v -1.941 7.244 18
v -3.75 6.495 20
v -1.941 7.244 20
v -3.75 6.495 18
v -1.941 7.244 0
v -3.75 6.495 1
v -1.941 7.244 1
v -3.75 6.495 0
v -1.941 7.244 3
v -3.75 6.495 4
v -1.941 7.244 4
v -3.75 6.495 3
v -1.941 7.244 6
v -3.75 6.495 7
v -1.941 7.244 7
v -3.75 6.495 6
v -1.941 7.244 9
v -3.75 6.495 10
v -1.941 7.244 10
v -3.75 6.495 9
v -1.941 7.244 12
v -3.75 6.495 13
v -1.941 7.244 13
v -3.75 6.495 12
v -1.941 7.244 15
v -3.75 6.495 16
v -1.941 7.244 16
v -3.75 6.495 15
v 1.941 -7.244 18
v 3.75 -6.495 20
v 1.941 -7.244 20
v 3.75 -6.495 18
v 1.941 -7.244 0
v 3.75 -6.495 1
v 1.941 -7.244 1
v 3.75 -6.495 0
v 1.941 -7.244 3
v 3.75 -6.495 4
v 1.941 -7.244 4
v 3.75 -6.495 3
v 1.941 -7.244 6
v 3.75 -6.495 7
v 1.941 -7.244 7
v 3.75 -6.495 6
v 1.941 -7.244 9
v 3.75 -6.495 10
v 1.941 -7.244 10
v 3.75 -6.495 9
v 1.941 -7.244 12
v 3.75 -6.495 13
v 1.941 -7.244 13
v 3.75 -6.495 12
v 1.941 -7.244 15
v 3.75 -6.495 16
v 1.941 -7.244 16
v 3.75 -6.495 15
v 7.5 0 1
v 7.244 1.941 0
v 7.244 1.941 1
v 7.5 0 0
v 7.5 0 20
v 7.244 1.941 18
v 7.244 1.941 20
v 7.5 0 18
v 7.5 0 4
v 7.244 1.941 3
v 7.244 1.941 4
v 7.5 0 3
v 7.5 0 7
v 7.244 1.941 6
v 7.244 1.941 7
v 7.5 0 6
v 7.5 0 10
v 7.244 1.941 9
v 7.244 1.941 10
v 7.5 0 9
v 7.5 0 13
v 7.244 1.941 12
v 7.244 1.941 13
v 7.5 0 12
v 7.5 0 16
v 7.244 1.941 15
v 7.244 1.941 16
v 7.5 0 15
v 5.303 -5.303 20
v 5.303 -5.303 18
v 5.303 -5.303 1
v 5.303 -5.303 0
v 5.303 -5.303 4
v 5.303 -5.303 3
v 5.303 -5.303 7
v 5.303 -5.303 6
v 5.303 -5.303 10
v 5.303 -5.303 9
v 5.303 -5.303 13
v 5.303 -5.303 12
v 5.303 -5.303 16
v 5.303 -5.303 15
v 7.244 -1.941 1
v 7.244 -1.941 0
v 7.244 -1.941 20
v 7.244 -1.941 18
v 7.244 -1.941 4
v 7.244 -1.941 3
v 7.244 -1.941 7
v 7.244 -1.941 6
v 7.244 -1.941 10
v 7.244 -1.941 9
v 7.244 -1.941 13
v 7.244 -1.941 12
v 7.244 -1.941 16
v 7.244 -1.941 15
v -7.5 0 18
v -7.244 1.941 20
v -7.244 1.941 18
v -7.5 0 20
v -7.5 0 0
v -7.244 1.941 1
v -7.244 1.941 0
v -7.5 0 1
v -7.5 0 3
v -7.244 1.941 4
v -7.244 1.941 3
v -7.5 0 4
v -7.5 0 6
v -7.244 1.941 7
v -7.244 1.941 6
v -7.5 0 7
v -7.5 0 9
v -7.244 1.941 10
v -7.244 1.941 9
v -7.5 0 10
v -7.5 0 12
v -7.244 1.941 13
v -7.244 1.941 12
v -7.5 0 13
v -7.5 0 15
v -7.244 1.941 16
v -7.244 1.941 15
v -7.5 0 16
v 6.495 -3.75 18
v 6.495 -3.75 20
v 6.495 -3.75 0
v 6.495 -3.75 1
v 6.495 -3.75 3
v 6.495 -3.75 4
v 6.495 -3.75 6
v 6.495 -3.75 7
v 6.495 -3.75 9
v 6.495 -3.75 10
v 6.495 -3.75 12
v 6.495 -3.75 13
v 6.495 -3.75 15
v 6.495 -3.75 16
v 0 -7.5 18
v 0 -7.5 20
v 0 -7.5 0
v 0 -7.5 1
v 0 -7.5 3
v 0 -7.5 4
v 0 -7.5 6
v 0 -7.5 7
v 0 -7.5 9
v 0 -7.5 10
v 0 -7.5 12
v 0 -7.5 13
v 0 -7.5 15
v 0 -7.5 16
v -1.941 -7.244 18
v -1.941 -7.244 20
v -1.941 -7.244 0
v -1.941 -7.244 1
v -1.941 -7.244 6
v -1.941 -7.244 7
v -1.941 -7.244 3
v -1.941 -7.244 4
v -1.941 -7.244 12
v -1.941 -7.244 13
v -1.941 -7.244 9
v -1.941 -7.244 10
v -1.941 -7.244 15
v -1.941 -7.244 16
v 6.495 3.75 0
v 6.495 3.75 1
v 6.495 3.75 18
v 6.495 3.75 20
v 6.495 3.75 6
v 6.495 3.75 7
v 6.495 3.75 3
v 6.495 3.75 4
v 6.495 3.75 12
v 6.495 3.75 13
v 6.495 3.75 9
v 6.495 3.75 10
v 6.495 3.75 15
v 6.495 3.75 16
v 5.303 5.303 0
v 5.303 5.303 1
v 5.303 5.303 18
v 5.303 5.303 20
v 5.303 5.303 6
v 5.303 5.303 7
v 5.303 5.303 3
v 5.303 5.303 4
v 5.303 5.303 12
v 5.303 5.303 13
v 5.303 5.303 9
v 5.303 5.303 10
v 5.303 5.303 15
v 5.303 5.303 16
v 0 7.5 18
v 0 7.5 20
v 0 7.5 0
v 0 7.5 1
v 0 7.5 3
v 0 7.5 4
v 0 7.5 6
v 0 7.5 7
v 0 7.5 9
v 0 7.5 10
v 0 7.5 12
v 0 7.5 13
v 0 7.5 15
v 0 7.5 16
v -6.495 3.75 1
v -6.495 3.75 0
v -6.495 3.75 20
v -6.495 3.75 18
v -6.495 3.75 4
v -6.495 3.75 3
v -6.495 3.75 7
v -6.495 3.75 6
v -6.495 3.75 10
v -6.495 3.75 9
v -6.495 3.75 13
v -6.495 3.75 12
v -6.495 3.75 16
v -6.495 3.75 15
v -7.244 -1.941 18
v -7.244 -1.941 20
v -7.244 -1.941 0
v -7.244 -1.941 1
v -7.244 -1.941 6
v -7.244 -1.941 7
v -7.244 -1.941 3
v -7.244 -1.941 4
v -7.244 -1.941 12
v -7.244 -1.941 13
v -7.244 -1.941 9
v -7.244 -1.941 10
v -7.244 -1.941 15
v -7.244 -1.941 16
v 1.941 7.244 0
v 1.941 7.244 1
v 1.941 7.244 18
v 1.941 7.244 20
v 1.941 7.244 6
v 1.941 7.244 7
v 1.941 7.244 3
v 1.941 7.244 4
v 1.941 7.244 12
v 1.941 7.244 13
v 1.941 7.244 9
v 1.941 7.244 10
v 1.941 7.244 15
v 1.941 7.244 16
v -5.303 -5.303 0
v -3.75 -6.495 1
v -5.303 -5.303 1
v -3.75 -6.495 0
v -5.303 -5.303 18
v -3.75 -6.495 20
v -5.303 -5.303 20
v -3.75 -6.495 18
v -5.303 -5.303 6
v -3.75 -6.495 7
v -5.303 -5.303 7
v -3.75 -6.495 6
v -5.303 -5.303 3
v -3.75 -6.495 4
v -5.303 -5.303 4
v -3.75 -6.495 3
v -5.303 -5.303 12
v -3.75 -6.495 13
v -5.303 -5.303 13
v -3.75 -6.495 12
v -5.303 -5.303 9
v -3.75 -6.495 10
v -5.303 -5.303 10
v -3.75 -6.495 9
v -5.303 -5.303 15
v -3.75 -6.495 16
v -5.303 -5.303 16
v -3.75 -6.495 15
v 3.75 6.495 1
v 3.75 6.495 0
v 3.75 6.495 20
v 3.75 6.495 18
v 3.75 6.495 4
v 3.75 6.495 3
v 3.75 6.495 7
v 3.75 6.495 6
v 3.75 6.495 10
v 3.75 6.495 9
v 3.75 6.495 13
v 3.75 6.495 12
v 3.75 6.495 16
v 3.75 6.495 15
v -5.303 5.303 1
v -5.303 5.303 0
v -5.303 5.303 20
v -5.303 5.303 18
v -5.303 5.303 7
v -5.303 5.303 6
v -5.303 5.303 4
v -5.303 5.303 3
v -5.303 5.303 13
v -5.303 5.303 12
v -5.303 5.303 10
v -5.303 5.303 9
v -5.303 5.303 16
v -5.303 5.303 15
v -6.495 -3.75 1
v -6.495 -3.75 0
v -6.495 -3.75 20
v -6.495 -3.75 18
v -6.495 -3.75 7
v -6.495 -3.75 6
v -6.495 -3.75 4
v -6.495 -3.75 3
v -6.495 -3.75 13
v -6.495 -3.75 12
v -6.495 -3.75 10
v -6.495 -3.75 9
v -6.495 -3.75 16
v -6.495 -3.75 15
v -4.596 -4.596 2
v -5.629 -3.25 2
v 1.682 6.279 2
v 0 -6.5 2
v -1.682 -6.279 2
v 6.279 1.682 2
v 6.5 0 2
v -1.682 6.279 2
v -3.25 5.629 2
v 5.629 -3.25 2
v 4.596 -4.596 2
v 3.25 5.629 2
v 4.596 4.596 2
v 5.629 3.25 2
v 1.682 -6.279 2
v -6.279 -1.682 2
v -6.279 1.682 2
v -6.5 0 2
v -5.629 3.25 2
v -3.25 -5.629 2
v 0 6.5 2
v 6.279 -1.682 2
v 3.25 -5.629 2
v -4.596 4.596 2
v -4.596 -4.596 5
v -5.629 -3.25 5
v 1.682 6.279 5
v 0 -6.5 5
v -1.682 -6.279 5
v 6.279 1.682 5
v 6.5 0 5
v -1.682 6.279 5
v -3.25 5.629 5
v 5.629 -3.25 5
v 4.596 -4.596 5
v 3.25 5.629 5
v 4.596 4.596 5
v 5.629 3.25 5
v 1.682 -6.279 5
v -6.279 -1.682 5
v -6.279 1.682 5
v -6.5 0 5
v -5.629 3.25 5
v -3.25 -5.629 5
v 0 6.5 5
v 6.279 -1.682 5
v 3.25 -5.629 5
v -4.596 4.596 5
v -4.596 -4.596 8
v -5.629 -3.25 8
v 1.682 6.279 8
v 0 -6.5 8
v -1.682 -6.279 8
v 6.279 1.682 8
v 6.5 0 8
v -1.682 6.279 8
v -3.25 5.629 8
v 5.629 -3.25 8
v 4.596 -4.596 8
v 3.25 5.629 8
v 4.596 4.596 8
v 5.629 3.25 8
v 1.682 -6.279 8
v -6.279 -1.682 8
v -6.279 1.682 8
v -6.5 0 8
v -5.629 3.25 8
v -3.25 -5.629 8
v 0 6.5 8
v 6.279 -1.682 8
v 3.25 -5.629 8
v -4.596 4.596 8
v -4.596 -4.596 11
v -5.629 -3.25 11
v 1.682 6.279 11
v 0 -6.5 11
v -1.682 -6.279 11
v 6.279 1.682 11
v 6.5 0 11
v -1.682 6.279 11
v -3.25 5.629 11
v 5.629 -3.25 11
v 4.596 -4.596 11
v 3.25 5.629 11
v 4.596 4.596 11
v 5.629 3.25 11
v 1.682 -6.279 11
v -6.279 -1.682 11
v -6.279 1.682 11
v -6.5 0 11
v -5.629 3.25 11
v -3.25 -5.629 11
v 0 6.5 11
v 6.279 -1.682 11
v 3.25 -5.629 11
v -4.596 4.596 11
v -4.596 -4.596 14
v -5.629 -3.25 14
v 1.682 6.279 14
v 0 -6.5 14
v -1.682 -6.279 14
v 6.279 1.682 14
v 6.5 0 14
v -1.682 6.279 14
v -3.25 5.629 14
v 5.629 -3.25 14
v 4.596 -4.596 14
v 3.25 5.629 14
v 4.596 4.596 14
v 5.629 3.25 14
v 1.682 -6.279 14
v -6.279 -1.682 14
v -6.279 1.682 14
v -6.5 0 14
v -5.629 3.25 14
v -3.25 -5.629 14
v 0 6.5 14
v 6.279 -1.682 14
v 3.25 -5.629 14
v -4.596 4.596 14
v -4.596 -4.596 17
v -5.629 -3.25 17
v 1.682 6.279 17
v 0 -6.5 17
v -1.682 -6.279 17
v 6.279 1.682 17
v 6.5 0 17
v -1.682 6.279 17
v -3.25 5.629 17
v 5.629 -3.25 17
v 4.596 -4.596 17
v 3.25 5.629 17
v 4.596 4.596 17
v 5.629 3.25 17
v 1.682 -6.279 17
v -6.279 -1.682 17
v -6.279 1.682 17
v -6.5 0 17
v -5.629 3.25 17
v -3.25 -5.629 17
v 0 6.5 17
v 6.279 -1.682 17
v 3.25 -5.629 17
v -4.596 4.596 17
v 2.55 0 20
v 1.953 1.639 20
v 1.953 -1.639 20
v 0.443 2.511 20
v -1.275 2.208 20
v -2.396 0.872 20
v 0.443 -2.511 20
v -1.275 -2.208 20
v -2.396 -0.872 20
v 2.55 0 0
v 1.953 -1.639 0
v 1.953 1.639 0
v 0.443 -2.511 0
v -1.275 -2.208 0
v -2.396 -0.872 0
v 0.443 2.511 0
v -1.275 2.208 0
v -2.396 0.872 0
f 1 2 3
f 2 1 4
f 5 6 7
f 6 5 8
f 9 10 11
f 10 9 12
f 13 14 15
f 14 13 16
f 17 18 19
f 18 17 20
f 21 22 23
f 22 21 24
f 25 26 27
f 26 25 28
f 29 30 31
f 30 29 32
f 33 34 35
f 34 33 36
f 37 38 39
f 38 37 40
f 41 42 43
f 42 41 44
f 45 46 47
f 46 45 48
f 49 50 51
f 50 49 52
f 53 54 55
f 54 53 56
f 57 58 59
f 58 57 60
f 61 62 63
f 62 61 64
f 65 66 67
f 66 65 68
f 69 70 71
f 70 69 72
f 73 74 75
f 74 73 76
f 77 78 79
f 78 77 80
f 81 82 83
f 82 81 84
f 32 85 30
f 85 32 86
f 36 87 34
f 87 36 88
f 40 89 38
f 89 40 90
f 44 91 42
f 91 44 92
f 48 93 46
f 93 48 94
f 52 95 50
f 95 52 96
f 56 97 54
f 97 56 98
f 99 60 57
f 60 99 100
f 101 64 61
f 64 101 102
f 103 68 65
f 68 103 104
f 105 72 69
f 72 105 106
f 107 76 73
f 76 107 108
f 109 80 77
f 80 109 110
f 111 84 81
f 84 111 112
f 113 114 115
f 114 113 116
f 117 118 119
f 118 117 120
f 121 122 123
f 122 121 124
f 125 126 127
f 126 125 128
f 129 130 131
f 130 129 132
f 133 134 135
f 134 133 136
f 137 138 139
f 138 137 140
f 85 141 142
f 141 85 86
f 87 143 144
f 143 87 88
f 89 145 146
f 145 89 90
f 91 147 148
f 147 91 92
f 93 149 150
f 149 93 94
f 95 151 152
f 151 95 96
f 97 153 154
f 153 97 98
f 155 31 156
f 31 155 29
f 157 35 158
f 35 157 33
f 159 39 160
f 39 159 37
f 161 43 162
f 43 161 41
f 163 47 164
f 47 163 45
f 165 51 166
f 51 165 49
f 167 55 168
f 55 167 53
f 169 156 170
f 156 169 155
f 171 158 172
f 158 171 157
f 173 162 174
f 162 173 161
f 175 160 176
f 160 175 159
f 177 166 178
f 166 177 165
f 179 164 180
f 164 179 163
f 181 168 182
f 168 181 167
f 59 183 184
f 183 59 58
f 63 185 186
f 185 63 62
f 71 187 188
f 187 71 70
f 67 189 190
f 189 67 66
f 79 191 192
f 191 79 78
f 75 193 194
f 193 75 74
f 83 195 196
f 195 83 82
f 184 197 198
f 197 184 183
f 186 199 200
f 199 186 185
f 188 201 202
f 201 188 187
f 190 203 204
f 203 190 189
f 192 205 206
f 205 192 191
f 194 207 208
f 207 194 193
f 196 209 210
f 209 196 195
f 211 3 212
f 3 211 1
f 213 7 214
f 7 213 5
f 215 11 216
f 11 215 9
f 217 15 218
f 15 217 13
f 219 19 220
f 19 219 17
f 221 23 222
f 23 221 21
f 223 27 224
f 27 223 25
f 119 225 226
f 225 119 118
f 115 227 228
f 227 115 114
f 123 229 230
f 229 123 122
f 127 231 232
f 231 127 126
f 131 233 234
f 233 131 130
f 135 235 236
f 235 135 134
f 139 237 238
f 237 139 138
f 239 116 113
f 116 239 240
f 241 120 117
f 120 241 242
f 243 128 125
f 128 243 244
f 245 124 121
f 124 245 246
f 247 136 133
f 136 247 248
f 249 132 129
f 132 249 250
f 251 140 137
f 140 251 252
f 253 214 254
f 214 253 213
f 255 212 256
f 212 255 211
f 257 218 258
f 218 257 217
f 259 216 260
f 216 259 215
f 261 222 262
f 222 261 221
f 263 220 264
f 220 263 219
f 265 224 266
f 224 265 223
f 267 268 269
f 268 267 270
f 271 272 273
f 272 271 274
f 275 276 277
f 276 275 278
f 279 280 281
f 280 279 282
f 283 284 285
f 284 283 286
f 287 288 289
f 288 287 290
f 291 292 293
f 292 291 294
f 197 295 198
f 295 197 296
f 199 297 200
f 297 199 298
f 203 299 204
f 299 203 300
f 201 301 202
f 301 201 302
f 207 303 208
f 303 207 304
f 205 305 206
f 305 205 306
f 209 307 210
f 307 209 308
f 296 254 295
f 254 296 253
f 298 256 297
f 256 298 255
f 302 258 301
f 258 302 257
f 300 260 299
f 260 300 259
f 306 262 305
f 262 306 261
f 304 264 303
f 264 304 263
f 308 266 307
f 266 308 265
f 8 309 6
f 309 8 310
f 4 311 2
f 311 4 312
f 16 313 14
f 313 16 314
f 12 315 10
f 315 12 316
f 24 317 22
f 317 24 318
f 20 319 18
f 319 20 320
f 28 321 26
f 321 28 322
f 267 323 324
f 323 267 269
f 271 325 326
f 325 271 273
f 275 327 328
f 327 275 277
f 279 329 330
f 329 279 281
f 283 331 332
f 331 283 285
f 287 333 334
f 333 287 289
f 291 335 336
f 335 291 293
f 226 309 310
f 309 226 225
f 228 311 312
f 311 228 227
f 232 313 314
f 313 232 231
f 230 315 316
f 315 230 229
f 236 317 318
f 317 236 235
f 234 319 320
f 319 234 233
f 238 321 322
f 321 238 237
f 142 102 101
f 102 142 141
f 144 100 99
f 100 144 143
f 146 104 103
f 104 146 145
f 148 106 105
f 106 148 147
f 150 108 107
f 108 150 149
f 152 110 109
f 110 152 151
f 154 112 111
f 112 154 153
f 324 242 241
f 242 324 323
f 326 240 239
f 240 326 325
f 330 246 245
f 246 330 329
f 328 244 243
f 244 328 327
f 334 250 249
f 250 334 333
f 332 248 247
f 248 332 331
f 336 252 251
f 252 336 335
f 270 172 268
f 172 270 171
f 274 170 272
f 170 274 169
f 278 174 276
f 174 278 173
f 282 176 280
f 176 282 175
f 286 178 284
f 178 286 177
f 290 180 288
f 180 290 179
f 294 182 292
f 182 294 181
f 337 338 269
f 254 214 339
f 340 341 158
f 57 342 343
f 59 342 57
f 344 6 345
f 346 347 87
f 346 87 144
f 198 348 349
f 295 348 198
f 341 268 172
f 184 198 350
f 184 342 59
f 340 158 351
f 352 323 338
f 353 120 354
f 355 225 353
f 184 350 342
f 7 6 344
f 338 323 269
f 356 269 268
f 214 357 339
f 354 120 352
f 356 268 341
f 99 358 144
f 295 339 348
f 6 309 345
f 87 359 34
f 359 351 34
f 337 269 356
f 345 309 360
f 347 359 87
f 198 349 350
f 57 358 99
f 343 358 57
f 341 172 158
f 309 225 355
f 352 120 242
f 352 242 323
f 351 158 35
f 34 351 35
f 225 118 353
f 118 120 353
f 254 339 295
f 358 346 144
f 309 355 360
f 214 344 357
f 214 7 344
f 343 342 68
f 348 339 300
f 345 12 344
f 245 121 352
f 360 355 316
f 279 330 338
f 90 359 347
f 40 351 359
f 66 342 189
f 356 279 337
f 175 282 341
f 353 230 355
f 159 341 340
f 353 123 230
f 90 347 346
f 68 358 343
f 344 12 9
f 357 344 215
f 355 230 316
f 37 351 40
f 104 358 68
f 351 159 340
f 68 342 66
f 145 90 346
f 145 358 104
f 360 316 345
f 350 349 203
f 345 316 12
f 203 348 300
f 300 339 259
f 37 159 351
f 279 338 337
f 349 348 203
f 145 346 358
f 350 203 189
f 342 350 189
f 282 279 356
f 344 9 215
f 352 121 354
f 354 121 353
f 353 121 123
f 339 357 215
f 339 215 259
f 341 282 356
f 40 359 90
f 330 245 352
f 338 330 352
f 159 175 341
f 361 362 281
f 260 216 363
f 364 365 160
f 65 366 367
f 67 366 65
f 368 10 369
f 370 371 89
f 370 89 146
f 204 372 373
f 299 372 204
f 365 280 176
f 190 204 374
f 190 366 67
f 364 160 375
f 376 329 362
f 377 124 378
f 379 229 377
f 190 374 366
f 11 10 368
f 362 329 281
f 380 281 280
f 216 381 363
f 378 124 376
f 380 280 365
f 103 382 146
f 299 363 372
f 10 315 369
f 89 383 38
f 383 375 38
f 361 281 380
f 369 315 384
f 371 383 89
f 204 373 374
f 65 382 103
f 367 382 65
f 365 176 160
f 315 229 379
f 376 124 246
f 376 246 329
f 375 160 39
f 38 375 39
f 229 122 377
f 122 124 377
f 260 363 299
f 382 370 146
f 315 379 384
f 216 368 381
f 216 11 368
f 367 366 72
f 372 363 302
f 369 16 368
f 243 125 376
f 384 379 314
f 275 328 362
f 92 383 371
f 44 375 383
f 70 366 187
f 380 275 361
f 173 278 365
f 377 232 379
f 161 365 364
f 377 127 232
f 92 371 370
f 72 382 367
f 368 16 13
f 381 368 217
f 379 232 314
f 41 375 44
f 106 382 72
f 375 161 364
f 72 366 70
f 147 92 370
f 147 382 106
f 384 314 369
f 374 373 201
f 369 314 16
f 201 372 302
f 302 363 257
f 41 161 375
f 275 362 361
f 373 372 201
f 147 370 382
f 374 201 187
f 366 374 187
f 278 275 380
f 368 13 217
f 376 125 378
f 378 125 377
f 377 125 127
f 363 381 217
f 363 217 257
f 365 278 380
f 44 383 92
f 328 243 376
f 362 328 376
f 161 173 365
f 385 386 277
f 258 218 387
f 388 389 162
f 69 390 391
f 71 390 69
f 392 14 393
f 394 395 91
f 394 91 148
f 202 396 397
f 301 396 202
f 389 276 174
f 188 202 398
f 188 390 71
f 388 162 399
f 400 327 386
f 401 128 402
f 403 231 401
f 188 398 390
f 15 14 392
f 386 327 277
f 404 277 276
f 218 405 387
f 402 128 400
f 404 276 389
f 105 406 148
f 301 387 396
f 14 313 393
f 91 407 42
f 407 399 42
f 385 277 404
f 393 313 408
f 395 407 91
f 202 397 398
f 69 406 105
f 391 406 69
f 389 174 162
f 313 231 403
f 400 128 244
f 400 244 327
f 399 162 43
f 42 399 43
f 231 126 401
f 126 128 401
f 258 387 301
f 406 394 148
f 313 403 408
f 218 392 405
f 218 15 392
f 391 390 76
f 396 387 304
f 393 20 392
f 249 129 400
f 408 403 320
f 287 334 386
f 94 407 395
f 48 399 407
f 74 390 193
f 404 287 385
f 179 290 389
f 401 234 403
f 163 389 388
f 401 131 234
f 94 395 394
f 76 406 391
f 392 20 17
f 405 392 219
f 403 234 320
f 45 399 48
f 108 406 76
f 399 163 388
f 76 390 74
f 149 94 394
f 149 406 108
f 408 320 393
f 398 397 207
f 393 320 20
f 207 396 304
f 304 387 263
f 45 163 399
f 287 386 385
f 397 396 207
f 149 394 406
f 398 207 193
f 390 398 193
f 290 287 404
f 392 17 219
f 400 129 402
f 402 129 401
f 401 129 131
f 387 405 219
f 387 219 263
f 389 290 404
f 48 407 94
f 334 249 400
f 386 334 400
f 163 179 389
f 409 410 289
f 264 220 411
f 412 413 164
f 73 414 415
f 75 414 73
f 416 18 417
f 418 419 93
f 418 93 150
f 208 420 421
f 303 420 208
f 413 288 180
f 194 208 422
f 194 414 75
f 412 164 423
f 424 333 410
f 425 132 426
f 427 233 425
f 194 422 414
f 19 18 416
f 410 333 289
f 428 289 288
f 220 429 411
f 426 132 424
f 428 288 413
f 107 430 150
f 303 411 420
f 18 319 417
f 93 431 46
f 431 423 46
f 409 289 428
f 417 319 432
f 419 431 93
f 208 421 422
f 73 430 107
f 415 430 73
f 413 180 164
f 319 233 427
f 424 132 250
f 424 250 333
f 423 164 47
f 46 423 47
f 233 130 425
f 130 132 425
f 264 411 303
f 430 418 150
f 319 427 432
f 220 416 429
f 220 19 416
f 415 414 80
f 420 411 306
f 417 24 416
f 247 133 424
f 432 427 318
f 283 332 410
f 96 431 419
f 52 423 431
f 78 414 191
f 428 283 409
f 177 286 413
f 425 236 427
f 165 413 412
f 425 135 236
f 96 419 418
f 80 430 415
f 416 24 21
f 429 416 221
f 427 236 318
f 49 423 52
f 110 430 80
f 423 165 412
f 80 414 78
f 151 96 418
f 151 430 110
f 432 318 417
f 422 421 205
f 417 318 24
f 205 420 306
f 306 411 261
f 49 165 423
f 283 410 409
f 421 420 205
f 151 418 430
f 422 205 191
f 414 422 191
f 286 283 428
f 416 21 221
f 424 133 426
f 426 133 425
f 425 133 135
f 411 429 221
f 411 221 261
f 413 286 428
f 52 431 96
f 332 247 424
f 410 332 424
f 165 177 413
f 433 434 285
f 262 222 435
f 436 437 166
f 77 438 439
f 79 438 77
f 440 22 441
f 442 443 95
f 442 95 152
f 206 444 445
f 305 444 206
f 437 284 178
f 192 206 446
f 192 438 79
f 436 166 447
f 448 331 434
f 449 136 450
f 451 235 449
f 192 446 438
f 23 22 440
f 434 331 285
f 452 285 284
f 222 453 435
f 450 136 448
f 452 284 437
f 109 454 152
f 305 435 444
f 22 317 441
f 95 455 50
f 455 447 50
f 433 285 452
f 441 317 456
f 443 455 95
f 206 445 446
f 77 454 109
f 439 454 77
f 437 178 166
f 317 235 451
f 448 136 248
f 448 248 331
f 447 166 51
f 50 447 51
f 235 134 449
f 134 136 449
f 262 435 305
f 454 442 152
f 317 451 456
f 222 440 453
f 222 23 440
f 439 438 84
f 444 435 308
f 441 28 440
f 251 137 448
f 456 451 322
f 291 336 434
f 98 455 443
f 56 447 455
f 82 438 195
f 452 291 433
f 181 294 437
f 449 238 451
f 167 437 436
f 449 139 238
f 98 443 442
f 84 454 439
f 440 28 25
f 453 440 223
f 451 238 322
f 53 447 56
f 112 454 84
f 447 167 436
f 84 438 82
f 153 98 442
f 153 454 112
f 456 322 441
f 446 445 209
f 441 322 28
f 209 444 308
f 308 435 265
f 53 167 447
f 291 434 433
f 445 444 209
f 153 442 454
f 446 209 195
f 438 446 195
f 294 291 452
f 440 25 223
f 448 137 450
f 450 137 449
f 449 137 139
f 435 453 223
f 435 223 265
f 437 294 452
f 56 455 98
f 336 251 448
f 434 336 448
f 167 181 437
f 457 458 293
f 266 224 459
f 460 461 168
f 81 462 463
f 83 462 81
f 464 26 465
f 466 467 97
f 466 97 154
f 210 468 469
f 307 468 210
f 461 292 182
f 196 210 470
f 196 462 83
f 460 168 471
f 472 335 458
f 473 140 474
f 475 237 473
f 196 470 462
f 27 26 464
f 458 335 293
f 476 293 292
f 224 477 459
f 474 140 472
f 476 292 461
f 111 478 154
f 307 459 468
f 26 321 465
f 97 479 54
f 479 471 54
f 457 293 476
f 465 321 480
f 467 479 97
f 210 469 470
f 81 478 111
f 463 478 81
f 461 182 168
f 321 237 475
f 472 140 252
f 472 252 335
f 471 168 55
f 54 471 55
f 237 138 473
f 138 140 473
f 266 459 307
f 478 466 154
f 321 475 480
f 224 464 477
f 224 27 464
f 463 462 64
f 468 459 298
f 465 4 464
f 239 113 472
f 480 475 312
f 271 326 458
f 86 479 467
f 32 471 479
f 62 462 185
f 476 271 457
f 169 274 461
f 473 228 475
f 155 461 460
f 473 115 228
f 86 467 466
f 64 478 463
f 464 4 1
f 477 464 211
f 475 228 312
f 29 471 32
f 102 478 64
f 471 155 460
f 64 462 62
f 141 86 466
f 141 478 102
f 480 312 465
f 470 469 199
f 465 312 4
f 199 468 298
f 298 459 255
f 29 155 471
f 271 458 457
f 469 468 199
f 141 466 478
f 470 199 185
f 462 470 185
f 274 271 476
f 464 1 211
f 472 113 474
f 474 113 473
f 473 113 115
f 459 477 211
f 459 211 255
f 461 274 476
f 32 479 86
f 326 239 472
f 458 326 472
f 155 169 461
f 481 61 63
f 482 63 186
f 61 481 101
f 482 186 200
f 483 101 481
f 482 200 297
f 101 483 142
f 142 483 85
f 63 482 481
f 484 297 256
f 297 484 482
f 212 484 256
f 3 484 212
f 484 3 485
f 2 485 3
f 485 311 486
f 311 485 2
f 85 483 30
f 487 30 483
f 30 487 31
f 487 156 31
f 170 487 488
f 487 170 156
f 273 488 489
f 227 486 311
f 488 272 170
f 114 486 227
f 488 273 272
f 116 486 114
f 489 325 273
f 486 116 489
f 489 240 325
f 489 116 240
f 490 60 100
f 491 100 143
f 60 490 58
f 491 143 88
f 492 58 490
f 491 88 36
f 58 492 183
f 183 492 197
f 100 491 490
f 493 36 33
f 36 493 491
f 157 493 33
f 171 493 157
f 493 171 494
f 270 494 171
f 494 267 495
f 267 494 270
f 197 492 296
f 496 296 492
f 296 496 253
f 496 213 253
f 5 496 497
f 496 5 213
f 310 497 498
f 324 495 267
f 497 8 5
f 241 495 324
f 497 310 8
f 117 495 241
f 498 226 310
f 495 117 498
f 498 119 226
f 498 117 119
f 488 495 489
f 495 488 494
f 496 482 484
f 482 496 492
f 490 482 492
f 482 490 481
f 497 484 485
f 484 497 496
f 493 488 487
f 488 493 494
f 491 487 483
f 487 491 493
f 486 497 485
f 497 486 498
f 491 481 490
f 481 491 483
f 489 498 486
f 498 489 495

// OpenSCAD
	//difference ()
	//	intersection ()
		//	union()
			//	rotate (half_thick_angle)
				//translate ([0,0,pitch_apex-apex_to_apex])
				//cylinder ($fn=number_of_teeth*2, r1=root_cone_full_radius,r2=0,h=apex_to_apex);
				//for (i = [1:number_of_teeth])   
 d_inner = 5.1;
 d_outer = 15; 
 height=20;
 thread_start_space=1;
 thread_space=1;
 thread_deep=1;
 thread_height=2;
 number_of_threads=6;
 difference(){
      cylinder (d=d_outer,h=height);   
      cylinder (d=d_inner,h=height);
      for (i = [0:number_of_threads-1]){
          translate([0,0,i*(thread_height+thread_space)+thread_start_space]){
            thread(d_outer/2-thread_deep,d_outer/2, thread_height);
          }
      }
 }

module thread(  r_inner=9, 
                r_outer=10,
                h=2
 ){
  difference(){
      cylinder (d=r_outer*2,h=h);
      cylinder (r1=r_outer,r2=r_inner,h=h/2);
        translate ([0,0,h/2]){
            cylinder (r1=r_inner,r2=r_outer,h=h/2);
        }       
    }

}
